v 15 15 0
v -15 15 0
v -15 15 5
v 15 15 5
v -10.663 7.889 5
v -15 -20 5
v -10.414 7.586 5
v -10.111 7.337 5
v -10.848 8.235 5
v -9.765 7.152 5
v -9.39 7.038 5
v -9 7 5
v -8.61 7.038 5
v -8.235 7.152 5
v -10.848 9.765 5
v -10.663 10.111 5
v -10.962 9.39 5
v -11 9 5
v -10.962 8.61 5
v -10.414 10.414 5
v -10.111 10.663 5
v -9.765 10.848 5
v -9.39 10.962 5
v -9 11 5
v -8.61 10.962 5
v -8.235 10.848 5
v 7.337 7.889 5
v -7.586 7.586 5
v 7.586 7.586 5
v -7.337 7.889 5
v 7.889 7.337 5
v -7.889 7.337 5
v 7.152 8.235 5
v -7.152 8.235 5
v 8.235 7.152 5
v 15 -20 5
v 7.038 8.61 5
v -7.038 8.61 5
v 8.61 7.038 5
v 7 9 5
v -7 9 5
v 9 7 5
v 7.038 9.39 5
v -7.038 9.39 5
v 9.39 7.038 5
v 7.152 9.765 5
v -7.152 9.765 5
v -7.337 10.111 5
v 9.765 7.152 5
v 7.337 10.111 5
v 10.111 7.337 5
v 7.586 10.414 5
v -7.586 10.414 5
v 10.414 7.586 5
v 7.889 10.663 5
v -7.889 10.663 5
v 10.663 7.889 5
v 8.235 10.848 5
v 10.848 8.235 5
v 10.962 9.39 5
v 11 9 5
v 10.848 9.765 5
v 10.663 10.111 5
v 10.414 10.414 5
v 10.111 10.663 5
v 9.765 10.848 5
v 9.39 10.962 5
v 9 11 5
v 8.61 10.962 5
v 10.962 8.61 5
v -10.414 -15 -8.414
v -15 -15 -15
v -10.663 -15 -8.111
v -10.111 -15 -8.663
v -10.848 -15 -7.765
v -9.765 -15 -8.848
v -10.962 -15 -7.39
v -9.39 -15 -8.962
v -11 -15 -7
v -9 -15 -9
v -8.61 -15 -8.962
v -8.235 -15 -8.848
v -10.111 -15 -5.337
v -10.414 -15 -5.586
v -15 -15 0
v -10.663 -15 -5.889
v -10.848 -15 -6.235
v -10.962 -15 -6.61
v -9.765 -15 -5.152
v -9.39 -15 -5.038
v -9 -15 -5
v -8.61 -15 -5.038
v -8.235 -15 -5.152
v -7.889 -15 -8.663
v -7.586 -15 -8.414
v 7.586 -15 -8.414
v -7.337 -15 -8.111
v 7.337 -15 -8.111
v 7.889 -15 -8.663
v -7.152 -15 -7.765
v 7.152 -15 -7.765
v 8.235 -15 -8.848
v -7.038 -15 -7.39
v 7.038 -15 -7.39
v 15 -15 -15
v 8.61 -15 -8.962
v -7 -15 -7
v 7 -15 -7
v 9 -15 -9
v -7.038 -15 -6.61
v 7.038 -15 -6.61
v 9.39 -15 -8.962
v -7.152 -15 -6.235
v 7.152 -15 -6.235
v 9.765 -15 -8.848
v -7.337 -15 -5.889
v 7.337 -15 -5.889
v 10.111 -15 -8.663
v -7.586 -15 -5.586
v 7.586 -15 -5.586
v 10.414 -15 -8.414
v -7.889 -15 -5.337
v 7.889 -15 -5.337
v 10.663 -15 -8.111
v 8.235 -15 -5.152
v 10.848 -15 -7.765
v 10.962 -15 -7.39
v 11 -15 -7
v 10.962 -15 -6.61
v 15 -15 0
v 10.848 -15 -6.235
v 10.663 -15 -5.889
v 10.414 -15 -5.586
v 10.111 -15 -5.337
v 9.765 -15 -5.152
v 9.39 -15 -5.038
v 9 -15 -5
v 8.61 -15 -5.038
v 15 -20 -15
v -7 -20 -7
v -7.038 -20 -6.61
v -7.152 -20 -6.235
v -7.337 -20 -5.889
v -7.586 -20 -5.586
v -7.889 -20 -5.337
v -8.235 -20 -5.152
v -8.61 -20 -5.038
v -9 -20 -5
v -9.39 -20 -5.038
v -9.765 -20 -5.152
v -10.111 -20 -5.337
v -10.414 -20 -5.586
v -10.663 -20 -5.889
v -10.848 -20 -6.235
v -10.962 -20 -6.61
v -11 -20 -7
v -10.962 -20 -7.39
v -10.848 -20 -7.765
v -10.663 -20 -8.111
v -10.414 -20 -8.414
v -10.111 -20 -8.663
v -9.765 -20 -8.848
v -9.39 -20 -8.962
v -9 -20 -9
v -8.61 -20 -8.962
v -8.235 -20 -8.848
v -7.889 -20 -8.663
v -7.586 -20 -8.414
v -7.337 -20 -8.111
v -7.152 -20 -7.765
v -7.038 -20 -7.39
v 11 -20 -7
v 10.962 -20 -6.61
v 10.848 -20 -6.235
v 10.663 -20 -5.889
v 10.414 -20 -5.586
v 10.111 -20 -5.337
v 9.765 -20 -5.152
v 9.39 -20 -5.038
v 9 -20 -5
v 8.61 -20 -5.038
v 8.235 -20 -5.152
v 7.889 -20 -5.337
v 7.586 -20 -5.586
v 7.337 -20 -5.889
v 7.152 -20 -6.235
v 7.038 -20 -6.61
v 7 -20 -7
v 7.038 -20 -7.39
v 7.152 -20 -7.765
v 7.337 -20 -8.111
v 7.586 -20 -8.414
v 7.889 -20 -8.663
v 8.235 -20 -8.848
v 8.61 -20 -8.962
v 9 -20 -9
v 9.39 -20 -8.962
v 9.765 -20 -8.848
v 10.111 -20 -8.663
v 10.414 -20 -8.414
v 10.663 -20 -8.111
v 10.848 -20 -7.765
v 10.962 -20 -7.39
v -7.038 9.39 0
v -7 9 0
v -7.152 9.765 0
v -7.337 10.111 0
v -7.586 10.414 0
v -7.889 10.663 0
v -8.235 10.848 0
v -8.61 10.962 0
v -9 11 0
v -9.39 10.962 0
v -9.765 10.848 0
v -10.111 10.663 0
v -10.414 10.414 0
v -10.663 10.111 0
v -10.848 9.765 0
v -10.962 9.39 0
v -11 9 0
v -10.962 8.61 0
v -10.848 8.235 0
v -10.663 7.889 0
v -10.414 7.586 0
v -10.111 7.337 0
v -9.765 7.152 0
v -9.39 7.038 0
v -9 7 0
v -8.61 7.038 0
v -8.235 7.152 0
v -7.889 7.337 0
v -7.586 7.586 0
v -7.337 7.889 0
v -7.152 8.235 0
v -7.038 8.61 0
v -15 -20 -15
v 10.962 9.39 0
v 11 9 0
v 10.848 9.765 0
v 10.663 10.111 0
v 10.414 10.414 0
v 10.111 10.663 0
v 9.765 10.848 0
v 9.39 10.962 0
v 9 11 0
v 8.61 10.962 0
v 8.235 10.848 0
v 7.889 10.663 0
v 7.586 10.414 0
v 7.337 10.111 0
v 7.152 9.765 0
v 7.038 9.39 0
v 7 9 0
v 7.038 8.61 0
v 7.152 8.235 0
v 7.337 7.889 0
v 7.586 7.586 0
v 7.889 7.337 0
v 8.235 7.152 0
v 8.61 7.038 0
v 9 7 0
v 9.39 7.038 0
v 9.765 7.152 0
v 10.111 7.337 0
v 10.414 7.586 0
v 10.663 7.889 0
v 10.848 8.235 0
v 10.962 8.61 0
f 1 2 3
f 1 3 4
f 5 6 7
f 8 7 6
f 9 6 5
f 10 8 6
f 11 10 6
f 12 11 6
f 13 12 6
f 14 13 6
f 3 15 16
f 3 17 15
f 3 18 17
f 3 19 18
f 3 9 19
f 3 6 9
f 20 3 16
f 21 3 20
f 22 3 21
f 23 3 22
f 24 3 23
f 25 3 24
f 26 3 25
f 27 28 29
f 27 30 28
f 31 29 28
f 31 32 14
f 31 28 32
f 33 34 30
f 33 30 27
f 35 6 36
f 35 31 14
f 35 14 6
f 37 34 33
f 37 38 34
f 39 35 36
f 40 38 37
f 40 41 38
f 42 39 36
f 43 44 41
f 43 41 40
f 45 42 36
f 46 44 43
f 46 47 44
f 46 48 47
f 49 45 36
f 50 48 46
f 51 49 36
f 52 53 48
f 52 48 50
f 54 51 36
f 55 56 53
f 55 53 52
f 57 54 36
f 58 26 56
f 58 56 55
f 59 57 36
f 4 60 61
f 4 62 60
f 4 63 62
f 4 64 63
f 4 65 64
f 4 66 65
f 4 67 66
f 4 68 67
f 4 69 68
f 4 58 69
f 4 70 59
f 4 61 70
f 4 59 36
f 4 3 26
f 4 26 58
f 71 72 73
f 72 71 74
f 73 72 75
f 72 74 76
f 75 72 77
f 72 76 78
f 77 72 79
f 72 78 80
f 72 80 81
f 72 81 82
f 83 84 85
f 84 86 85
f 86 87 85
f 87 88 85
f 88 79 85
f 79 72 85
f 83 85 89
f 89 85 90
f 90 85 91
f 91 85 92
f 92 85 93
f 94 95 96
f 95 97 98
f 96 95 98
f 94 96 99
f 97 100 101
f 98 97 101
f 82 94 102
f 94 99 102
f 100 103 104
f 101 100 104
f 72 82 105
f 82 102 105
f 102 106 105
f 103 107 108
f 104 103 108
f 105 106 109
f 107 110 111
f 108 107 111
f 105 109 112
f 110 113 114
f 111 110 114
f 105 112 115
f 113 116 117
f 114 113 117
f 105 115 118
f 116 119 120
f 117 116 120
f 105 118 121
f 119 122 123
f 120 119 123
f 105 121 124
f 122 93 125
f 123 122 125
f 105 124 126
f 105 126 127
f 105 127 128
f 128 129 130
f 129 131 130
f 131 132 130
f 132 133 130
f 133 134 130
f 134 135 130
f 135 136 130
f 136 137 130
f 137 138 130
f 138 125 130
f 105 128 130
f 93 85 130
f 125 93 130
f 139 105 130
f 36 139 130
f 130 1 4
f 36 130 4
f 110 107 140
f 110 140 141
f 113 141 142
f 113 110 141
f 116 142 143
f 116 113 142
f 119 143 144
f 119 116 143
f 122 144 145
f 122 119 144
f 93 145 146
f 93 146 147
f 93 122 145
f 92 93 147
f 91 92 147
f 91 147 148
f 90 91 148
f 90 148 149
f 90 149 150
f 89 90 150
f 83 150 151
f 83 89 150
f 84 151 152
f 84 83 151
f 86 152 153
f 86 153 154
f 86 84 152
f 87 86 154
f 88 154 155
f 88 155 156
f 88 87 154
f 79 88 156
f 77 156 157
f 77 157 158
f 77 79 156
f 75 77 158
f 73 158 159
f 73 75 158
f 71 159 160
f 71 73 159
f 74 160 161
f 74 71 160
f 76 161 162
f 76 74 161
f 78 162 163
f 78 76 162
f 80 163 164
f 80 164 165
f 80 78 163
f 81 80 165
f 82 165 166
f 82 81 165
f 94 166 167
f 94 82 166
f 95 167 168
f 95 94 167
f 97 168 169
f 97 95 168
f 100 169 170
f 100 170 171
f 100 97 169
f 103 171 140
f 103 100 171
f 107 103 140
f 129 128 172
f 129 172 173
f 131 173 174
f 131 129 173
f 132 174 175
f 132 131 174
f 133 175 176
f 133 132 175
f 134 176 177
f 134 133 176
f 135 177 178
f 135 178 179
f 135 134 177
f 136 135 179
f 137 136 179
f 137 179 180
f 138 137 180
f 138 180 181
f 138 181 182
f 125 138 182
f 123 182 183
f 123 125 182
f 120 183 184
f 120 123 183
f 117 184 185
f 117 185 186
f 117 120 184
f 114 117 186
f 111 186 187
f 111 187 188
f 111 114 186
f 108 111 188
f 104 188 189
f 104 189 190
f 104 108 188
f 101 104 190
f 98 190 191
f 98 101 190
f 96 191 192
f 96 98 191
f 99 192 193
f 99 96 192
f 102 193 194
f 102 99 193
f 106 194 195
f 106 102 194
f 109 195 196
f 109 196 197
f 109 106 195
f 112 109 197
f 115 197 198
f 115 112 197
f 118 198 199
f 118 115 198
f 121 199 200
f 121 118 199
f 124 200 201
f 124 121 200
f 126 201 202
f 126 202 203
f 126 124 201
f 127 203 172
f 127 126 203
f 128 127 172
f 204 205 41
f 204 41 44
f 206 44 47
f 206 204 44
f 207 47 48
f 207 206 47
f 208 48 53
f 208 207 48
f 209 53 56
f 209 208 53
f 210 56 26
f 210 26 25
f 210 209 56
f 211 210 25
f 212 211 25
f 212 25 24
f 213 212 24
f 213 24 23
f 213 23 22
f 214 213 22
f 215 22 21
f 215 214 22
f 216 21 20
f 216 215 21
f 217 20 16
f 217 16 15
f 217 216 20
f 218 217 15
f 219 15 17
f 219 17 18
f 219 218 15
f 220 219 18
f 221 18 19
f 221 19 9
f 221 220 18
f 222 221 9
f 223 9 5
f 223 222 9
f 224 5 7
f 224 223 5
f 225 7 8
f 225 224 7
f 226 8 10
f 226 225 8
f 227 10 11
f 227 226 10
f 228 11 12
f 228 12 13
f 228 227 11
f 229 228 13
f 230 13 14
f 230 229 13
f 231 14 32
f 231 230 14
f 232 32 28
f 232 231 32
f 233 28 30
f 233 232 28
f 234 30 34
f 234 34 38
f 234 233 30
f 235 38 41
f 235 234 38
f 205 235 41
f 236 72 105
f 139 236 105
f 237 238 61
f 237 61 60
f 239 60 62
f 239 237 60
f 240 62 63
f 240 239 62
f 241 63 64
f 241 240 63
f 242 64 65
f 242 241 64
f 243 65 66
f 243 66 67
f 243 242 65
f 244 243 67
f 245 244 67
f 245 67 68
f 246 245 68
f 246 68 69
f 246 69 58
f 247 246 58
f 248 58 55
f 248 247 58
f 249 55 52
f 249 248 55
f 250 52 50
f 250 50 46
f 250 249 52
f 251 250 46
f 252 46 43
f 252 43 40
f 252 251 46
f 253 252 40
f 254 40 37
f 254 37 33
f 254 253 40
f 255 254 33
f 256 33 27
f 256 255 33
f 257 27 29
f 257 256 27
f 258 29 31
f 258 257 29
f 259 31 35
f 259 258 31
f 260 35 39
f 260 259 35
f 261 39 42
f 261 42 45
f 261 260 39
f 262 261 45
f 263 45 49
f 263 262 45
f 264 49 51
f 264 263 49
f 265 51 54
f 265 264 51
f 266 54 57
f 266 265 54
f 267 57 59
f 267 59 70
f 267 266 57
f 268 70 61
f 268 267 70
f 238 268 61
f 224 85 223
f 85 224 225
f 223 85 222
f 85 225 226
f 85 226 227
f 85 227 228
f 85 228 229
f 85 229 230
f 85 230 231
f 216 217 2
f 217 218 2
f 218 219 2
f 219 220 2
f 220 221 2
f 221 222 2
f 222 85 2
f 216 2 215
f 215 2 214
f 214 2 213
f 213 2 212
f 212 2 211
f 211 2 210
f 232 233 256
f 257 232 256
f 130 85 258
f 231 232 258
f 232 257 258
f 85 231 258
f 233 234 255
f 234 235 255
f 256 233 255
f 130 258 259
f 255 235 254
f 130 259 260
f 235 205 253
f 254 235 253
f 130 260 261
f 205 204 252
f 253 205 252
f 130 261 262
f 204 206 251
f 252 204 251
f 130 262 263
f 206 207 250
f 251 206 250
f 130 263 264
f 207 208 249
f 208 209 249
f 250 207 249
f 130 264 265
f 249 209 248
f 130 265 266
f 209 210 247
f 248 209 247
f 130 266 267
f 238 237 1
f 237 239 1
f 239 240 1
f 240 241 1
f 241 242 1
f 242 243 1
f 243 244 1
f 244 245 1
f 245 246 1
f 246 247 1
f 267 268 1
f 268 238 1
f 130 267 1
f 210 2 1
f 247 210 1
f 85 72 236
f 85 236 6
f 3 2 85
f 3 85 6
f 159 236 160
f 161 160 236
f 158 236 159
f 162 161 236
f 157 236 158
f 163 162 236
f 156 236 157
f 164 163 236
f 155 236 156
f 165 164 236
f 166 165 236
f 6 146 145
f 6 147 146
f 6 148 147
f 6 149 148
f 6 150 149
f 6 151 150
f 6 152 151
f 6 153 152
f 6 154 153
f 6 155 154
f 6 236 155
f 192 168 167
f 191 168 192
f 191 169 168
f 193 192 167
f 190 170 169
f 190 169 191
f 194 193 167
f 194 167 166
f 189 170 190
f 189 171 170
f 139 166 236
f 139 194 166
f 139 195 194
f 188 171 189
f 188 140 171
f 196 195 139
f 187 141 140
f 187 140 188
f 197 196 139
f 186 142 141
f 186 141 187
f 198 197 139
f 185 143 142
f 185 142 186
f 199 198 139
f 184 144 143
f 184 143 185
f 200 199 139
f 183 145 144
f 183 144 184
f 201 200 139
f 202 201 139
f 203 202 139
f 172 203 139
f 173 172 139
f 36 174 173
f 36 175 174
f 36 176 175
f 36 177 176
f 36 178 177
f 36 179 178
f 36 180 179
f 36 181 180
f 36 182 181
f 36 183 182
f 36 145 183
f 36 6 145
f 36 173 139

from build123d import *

# Parameters (mm, degrees)
ESBO_O1_W                = 30
ESBO_O1_H                = 30
ESBO_O1_R                = 2
RESSALTO_EXTRUS_O1_DEPTH = 5
ESBO_O2_W                = 30
ESBO_O2_H                = 20
ESBO_O2_R                = 2
RESSALTO_EXTRUS_O2_DEPTH = 5


with BuildPart() as part:
    # Esboço1 → Ressalto-extrusão1 (new body)
    with BuildSketch(Plane.XY):
        Rectangle(ESBO_O1_W, ESBO_O1_H)
        with Locations((-9, 9)):
            Circle(ESBO_O1_R, mode=Mode.SUBTRACT)
        with Locations((9, 9)):
            Circle(ESBO_O1_R, mode=Mode.SUBTRACT)
    extrude(amount=RESSALTO_EXTRUS_O1_DEPTH)

    # Esboço2 → Ressalto-extrusão2 (add)
    with BuildSketch(Plane.XZ.offset(15)):
        with Locations((0, -5)):
            Rectangle(ESBO_O2_W, ESBO_O2_H)
        with Locations((-9, -7)):
            Circle(ESBO_O2_R, mode=Mode.SUBTRACT)
        with Locations((9, -7)):
            Circle(ESBO_O2_R, mode=Mode.SUBTRACT)
    extrude(amount=RESSALTO_EXTRUS_O2_DEPTH)


solid = part.part
